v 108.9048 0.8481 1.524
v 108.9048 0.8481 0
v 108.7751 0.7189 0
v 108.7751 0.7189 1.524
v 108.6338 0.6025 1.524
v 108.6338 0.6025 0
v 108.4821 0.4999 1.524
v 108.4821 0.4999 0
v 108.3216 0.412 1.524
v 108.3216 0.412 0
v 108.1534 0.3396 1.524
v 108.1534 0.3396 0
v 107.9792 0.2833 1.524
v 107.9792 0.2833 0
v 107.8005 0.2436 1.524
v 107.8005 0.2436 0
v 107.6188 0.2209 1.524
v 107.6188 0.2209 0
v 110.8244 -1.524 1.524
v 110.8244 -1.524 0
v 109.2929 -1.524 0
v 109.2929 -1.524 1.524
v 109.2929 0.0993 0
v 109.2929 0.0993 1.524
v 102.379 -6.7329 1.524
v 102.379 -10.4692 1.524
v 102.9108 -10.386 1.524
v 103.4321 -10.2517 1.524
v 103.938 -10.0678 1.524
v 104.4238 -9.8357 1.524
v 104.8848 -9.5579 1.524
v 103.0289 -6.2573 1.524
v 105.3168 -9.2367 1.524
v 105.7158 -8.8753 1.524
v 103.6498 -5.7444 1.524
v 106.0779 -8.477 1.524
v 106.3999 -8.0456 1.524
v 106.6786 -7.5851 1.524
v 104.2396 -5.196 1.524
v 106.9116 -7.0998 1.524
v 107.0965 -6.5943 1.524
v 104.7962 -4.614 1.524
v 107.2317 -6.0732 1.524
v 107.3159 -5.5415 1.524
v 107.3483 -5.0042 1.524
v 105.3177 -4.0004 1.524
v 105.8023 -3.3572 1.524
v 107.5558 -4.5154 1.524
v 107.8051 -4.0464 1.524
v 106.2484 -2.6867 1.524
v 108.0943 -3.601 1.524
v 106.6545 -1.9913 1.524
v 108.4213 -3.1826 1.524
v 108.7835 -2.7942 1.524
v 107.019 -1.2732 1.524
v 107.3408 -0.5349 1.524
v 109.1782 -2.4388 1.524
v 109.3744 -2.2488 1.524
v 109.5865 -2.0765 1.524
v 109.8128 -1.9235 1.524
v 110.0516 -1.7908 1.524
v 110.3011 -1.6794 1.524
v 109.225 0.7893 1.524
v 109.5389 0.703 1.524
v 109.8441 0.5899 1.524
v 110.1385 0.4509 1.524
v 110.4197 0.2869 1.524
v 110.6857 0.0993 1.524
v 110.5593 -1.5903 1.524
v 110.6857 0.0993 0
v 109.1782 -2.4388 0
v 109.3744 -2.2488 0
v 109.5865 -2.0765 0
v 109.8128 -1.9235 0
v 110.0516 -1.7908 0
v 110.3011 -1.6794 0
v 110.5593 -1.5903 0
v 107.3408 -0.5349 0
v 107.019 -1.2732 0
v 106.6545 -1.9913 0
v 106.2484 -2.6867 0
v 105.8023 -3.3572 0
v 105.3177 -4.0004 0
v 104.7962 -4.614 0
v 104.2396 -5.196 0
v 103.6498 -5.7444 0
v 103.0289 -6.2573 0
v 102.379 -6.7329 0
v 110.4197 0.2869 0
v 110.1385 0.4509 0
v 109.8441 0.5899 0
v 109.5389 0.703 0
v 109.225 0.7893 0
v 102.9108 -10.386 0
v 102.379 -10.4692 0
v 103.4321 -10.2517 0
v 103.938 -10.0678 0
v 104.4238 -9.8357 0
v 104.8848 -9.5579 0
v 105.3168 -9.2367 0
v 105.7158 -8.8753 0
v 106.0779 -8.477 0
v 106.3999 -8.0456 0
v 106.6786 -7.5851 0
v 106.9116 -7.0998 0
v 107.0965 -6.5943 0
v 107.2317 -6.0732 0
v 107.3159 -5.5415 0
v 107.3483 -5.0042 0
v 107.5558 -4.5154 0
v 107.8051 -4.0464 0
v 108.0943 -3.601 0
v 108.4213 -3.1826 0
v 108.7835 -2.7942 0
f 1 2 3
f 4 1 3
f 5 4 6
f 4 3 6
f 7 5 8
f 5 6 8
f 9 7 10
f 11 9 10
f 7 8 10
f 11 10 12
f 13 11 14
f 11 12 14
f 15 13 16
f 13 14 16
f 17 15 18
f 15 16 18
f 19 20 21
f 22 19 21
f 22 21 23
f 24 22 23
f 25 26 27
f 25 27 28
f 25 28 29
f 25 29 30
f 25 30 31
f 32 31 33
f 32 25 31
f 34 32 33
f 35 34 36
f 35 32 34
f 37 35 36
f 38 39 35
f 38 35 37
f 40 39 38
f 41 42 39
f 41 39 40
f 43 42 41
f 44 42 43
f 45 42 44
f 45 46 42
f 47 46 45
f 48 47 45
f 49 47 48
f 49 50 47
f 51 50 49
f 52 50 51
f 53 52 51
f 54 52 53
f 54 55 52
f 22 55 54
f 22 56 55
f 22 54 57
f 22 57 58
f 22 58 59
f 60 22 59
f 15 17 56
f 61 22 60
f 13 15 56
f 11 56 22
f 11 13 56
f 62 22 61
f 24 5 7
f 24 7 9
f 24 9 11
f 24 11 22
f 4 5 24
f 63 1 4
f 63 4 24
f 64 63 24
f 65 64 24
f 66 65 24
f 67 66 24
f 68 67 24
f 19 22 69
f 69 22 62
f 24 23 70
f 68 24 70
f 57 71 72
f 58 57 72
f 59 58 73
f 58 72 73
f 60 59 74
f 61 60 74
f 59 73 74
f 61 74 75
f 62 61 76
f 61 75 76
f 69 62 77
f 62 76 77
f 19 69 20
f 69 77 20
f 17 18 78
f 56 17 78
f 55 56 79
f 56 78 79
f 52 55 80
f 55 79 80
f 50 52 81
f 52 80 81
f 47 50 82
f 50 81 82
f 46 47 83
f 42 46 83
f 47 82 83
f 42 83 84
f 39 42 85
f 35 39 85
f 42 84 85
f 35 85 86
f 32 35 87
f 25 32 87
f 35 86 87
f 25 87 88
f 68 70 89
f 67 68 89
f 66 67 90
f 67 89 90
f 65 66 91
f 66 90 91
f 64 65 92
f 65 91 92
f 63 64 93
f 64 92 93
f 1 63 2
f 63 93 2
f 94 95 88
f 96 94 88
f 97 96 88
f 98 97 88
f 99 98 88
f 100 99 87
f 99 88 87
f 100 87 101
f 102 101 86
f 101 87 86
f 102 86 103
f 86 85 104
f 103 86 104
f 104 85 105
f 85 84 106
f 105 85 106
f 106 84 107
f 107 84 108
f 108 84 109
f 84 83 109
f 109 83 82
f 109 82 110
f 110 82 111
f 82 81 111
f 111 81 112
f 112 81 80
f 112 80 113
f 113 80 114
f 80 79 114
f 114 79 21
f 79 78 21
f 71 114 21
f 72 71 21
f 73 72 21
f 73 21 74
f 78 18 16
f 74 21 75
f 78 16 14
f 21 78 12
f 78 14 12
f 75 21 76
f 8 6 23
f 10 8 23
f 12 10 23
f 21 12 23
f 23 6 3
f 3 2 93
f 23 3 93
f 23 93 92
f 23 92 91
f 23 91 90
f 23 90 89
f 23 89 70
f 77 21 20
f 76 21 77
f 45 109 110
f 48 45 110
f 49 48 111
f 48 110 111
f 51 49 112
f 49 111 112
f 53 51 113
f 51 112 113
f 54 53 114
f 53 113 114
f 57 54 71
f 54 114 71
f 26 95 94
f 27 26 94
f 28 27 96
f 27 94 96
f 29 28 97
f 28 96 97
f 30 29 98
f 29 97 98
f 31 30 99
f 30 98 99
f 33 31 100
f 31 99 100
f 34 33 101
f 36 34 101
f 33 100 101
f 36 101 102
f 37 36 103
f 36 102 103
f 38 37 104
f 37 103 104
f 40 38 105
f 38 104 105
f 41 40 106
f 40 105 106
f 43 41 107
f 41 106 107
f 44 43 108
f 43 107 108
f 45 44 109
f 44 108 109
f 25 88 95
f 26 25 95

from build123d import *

# Parameters (mm, degrees)
BOSS_EXTRUDE1_DEPTH = 1.524


with BuildPart() as part:
    # Sketch1 → Boss-Extrude1 (new body)
    with BuildSketch(Plane.XY):
        with BuildLine():
            Line((110.824360774, -1.524), (109.29292347, -1.524))
            Line((109.29292347, -1.524), (109.29292347, 0.099254425))
            Line((109.29292347, 0.099254425), (110.685720546, 0.099254425))
            ThreePointArc((110.685720546, 0.099254425), (109.844126395, 0.589914025), (108.904790048, 0.848128638))
            ThreePointArc((108.904790048, 0.848128638), (108.321557599, 0.411980775), (107.618800979, 0.220883469))
            ThreePointArc((107.618800979, 0.220883469), (105.564728066, -3.682348009), (102.379001913, -6.732852948))
            Line((102.379001913, -6.732852948), (102.379001913, -10.469177864))
            ThreePointArc((102.379001913, -10.469177864), (105.901664911, -8.680555585), (107.348345234, -5.004220414))
            ThreePointArc((107.348345234, -5.004220414), (108.094332128, -3.601037602), (109.178159994, -2.438826088))
            ThreePointArc((109.178159994, -2.438826088), (109.930755444, -1.854541621), (110.824360774, -1.524))
        make_face()
    extrude(amount=BOSS_EXTRUDE1_DEPTH)


solid = part.part
